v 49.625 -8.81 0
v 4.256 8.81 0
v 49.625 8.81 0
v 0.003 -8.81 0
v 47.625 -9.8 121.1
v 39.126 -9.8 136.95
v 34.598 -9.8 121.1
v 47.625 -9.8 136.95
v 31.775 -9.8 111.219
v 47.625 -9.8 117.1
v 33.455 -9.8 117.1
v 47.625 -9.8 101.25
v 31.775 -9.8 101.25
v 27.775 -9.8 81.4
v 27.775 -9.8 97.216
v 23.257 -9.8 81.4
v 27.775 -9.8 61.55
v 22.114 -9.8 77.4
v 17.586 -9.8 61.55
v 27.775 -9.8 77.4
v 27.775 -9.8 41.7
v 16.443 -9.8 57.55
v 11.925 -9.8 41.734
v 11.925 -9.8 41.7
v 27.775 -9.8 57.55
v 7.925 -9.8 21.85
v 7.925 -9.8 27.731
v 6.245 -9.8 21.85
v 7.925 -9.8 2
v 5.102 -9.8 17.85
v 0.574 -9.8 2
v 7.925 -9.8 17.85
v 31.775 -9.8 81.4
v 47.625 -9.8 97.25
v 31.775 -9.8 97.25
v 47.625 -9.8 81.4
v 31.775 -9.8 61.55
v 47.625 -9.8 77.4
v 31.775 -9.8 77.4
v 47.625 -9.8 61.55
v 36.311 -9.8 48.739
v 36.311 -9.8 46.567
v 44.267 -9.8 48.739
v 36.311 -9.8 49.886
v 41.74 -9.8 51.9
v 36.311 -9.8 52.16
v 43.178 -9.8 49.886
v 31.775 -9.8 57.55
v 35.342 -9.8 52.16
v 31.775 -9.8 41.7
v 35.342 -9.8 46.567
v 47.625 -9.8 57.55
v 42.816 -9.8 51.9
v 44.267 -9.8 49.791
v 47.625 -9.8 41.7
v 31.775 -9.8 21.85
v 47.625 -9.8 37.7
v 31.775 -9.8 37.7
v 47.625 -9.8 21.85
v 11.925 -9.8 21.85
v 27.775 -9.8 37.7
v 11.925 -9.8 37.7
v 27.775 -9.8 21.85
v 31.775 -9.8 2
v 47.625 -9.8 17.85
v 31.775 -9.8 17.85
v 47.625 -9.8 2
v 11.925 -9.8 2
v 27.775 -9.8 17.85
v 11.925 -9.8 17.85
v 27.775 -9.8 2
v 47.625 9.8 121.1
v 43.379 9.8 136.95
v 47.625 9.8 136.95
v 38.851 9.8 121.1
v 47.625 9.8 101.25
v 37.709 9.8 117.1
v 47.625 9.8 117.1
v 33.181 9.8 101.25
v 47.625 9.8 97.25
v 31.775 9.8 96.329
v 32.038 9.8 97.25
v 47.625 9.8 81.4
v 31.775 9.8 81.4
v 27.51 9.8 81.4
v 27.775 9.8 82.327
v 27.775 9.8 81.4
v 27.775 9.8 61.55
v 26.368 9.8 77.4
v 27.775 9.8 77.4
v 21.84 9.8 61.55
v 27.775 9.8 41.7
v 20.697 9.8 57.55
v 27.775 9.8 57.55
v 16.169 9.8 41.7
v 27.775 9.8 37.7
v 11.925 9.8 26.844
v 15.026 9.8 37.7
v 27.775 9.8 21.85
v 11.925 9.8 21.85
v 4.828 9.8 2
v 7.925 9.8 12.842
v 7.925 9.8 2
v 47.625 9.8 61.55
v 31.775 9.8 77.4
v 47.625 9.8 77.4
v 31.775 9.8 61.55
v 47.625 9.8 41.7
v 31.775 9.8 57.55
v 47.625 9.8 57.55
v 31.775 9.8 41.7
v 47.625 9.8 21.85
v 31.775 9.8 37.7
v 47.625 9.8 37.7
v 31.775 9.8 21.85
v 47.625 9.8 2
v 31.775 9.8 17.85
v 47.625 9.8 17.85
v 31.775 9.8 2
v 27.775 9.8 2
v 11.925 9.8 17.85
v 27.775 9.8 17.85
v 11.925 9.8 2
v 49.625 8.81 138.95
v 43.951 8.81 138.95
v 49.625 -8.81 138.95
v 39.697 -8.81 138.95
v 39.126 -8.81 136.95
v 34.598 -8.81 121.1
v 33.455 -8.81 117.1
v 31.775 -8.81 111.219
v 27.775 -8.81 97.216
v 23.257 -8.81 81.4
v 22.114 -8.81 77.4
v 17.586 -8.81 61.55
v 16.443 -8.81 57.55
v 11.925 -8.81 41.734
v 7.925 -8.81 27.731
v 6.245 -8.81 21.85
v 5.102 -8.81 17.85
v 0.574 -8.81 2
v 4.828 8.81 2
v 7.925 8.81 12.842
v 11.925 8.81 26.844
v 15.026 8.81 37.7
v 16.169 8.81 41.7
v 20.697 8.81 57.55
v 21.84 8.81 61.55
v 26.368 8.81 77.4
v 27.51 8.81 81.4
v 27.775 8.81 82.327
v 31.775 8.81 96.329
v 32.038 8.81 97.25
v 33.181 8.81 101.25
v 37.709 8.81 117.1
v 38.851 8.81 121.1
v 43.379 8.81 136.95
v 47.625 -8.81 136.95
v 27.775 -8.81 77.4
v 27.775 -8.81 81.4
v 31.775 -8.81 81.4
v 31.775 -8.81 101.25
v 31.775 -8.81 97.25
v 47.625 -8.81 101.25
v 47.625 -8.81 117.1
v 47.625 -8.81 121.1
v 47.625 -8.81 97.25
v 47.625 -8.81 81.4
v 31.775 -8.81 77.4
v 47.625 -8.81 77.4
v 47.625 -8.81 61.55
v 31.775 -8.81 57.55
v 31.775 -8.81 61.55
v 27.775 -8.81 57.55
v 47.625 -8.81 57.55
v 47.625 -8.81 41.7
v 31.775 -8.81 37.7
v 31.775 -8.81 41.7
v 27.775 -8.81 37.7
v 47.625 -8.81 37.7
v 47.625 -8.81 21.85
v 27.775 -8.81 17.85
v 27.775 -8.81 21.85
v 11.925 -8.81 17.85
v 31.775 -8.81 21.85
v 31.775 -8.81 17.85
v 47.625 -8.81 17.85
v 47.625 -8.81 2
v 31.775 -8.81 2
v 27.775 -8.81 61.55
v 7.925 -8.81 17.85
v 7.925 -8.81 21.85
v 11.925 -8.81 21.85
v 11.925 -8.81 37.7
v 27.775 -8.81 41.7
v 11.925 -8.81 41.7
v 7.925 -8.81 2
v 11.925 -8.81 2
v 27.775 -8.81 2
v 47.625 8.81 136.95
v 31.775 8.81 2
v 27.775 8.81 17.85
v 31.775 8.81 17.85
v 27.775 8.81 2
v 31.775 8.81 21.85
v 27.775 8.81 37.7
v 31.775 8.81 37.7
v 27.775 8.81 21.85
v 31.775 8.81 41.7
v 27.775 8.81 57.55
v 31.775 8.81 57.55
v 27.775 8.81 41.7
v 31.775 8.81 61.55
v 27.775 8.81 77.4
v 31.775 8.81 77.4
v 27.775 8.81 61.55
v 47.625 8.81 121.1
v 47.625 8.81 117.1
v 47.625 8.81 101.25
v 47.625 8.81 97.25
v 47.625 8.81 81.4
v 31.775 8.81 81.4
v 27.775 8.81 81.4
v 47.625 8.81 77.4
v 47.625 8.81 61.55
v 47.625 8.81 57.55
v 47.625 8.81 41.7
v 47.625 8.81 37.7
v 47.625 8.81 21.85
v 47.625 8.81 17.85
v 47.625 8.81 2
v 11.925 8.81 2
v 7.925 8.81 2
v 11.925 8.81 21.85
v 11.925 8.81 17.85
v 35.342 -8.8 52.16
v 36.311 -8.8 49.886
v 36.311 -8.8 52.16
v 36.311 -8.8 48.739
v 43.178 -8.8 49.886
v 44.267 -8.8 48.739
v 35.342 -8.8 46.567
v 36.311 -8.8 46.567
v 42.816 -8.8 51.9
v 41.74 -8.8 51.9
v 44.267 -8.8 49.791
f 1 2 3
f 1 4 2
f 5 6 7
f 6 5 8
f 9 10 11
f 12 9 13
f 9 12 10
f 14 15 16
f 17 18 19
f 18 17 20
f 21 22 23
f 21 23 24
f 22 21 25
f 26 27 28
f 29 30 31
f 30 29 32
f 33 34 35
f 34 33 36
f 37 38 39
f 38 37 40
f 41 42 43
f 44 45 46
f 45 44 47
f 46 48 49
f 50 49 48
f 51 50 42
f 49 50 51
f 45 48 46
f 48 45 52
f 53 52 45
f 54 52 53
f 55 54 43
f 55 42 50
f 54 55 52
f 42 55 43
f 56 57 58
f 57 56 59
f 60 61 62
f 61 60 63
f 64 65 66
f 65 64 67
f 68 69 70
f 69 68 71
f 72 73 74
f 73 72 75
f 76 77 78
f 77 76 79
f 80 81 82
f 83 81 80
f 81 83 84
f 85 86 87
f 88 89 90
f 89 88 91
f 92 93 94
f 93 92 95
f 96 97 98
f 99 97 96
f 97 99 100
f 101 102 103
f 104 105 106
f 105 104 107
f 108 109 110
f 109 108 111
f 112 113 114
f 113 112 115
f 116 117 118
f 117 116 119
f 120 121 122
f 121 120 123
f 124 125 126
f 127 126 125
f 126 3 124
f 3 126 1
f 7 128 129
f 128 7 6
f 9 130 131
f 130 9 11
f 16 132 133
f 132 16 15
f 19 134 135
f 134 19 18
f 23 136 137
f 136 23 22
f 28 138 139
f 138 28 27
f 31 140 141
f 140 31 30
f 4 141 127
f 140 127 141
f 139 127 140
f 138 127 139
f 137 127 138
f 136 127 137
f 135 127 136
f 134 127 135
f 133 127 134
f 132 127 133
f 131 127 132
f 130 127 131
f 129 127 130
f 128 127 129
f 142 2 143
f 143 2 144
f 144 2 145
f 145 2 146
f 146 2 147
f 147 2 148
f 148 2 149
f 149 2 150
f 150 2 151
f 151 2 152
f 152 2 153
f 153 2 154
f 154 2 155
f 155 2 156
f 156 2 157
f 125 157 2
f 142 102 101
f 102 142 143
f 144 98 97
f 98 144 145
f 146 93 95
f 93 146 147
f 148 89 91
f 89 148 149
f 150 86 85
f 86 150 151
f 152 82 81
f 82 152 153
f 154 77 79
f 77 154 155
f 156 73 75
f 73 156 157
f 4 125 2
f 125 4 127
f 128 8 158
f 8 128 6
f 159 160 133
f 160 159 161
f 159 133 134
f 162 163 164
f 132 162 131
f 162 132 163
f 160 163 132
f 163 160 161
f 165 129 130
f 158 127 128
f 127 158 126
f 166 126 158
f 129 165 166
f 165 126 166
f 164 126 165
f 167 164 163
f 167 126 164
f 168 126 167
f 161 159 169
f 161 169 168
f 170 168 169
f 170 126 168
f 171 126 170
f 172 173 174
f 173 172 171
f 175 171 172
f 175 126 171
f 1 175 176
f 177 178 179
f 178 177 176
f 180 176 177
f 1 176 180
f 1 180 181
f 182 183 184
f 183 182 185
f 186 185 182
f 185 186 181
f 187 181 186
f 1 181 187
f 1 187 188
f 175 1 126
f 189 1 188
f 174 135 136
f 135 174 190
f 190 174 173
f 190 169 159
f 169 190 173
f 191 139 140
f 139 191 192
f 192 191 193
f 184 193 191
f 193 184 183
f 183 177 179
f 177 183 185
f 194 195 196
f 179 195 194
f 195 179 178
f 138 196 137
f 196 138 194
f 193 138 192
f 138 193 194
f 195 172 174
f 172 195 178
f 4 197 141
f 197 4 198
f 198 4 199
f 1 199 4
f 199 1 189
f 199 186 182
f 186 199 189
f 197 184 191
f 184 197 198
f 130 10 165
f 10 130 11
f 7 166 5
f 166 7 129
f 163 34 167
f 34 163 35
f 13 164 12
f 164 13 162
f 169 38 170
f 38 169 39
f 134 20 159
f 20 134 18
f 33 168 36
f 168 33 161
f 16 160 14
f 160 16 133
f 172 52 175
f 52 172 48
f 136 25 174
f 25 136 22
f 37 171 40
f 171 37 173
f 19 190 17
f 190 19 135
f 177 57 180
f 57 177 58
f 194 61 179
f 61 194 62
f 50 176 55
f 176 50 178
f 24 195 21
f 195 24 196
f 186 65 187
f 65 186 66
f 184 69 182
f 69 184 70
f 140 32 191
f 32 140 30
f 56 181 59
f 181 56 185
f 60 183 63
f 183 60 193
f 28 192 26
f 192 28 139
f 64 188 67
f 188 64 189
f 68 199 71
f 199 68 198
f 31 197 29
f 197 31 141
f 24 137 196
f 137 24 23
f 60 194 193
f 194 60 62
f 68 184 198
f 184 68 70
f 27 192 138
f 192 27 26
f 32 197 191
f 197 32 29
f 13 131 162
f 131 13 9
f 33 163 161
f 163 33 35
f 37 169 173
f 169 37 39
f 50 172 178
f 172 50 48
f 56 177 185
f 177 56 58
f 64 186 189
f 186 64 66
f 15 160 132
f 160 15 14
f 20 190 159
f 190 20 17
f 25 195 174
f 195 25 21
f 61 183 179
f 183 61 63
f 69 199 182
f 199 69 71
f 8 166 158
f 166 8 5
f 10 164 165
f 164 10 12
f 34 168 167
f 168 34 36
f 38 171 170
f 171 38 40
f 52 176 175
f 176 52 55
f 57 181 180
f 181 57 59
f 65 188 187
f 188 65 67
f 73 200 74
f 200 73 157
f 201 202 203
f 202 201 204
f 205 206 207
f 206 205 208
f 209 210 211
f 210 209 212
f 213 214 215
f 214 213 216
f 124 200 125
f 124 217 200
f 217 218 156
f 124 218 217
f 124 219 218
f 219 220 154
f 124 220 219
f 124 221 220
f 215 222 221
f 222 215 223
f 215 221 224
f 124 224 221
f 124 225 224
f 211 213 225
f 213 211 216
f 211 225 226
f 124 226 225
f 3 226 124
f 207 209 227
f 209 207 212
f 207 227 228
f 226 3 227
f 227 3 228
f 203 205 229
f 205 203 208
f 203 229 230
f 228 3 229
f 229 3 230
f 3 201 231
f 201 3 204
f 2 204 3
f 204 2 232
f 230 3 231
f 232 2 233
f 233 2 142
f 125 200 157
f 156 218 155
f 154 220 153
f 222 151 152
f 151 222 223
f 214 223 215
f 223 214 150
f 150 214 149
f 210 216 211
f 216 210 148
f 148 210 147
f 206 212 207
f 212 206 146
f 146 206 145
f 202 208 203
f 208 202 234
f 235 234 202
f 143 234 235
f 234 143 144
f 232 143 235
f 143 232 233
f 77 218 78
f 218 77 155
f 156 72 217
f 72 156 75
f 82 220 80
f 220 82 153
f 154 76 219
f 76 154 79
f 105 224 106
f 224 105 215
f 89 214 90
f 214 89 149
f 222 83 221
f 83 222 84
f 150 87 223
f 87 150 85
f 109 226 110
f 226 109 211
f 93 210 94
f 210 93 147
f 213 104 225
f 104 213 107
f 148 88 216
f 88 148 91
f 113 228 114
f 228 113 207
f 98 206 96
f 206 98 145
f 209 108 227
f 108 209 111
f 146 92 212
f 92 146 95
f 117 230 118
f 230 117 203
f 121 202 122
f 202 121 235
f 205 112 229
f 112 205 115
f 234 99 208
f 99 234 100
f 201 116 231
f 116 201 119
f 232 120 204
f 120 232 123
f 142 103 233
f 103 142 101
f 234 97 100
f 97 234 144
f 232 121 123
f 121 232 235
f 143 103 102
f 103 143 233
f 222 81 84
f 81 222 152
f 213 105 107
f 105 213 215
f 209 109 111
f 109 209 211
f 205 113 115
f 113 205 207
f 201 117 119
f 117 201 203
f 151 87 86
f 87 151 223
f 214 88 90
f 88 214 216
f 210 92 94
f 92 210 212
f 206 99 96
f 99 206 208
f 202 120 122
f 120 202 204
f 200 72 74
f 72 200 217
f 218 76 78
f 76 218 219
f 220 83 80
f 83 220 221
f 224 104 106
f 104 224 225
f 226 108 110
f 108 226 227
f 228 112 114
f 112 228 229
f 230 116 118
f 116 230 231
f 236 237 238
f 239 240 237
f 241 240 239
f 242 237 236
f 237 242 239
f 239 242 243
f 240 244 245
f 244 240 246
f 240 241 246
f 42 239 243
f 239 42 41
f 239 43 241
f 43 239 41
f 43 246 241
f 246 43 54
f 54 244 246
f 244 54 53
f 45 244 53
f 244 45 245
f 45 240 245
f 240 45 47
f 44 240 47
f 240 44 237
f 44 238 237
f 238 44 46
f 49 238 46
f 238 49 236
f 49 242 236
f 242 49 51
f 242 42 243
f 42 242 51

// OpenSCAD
/*

  puzzle_part_1.scad

  Winston Freer Tile Puzzle: Part 1
      
  (c) olikraus@gmail.com

  This work is licensed under the Creative Commons Attribution-NonCommercial-ShareAlike 4.0 International License. 
  To view a copy of this license, visit http://creativecommons.org/licenses/by-nc-sa/4.0/.
    
*/

include <winston_freer.scad>;


rotate([0,90,-90])
translate([-7*ts,-6.5*ts,0])
part1();
